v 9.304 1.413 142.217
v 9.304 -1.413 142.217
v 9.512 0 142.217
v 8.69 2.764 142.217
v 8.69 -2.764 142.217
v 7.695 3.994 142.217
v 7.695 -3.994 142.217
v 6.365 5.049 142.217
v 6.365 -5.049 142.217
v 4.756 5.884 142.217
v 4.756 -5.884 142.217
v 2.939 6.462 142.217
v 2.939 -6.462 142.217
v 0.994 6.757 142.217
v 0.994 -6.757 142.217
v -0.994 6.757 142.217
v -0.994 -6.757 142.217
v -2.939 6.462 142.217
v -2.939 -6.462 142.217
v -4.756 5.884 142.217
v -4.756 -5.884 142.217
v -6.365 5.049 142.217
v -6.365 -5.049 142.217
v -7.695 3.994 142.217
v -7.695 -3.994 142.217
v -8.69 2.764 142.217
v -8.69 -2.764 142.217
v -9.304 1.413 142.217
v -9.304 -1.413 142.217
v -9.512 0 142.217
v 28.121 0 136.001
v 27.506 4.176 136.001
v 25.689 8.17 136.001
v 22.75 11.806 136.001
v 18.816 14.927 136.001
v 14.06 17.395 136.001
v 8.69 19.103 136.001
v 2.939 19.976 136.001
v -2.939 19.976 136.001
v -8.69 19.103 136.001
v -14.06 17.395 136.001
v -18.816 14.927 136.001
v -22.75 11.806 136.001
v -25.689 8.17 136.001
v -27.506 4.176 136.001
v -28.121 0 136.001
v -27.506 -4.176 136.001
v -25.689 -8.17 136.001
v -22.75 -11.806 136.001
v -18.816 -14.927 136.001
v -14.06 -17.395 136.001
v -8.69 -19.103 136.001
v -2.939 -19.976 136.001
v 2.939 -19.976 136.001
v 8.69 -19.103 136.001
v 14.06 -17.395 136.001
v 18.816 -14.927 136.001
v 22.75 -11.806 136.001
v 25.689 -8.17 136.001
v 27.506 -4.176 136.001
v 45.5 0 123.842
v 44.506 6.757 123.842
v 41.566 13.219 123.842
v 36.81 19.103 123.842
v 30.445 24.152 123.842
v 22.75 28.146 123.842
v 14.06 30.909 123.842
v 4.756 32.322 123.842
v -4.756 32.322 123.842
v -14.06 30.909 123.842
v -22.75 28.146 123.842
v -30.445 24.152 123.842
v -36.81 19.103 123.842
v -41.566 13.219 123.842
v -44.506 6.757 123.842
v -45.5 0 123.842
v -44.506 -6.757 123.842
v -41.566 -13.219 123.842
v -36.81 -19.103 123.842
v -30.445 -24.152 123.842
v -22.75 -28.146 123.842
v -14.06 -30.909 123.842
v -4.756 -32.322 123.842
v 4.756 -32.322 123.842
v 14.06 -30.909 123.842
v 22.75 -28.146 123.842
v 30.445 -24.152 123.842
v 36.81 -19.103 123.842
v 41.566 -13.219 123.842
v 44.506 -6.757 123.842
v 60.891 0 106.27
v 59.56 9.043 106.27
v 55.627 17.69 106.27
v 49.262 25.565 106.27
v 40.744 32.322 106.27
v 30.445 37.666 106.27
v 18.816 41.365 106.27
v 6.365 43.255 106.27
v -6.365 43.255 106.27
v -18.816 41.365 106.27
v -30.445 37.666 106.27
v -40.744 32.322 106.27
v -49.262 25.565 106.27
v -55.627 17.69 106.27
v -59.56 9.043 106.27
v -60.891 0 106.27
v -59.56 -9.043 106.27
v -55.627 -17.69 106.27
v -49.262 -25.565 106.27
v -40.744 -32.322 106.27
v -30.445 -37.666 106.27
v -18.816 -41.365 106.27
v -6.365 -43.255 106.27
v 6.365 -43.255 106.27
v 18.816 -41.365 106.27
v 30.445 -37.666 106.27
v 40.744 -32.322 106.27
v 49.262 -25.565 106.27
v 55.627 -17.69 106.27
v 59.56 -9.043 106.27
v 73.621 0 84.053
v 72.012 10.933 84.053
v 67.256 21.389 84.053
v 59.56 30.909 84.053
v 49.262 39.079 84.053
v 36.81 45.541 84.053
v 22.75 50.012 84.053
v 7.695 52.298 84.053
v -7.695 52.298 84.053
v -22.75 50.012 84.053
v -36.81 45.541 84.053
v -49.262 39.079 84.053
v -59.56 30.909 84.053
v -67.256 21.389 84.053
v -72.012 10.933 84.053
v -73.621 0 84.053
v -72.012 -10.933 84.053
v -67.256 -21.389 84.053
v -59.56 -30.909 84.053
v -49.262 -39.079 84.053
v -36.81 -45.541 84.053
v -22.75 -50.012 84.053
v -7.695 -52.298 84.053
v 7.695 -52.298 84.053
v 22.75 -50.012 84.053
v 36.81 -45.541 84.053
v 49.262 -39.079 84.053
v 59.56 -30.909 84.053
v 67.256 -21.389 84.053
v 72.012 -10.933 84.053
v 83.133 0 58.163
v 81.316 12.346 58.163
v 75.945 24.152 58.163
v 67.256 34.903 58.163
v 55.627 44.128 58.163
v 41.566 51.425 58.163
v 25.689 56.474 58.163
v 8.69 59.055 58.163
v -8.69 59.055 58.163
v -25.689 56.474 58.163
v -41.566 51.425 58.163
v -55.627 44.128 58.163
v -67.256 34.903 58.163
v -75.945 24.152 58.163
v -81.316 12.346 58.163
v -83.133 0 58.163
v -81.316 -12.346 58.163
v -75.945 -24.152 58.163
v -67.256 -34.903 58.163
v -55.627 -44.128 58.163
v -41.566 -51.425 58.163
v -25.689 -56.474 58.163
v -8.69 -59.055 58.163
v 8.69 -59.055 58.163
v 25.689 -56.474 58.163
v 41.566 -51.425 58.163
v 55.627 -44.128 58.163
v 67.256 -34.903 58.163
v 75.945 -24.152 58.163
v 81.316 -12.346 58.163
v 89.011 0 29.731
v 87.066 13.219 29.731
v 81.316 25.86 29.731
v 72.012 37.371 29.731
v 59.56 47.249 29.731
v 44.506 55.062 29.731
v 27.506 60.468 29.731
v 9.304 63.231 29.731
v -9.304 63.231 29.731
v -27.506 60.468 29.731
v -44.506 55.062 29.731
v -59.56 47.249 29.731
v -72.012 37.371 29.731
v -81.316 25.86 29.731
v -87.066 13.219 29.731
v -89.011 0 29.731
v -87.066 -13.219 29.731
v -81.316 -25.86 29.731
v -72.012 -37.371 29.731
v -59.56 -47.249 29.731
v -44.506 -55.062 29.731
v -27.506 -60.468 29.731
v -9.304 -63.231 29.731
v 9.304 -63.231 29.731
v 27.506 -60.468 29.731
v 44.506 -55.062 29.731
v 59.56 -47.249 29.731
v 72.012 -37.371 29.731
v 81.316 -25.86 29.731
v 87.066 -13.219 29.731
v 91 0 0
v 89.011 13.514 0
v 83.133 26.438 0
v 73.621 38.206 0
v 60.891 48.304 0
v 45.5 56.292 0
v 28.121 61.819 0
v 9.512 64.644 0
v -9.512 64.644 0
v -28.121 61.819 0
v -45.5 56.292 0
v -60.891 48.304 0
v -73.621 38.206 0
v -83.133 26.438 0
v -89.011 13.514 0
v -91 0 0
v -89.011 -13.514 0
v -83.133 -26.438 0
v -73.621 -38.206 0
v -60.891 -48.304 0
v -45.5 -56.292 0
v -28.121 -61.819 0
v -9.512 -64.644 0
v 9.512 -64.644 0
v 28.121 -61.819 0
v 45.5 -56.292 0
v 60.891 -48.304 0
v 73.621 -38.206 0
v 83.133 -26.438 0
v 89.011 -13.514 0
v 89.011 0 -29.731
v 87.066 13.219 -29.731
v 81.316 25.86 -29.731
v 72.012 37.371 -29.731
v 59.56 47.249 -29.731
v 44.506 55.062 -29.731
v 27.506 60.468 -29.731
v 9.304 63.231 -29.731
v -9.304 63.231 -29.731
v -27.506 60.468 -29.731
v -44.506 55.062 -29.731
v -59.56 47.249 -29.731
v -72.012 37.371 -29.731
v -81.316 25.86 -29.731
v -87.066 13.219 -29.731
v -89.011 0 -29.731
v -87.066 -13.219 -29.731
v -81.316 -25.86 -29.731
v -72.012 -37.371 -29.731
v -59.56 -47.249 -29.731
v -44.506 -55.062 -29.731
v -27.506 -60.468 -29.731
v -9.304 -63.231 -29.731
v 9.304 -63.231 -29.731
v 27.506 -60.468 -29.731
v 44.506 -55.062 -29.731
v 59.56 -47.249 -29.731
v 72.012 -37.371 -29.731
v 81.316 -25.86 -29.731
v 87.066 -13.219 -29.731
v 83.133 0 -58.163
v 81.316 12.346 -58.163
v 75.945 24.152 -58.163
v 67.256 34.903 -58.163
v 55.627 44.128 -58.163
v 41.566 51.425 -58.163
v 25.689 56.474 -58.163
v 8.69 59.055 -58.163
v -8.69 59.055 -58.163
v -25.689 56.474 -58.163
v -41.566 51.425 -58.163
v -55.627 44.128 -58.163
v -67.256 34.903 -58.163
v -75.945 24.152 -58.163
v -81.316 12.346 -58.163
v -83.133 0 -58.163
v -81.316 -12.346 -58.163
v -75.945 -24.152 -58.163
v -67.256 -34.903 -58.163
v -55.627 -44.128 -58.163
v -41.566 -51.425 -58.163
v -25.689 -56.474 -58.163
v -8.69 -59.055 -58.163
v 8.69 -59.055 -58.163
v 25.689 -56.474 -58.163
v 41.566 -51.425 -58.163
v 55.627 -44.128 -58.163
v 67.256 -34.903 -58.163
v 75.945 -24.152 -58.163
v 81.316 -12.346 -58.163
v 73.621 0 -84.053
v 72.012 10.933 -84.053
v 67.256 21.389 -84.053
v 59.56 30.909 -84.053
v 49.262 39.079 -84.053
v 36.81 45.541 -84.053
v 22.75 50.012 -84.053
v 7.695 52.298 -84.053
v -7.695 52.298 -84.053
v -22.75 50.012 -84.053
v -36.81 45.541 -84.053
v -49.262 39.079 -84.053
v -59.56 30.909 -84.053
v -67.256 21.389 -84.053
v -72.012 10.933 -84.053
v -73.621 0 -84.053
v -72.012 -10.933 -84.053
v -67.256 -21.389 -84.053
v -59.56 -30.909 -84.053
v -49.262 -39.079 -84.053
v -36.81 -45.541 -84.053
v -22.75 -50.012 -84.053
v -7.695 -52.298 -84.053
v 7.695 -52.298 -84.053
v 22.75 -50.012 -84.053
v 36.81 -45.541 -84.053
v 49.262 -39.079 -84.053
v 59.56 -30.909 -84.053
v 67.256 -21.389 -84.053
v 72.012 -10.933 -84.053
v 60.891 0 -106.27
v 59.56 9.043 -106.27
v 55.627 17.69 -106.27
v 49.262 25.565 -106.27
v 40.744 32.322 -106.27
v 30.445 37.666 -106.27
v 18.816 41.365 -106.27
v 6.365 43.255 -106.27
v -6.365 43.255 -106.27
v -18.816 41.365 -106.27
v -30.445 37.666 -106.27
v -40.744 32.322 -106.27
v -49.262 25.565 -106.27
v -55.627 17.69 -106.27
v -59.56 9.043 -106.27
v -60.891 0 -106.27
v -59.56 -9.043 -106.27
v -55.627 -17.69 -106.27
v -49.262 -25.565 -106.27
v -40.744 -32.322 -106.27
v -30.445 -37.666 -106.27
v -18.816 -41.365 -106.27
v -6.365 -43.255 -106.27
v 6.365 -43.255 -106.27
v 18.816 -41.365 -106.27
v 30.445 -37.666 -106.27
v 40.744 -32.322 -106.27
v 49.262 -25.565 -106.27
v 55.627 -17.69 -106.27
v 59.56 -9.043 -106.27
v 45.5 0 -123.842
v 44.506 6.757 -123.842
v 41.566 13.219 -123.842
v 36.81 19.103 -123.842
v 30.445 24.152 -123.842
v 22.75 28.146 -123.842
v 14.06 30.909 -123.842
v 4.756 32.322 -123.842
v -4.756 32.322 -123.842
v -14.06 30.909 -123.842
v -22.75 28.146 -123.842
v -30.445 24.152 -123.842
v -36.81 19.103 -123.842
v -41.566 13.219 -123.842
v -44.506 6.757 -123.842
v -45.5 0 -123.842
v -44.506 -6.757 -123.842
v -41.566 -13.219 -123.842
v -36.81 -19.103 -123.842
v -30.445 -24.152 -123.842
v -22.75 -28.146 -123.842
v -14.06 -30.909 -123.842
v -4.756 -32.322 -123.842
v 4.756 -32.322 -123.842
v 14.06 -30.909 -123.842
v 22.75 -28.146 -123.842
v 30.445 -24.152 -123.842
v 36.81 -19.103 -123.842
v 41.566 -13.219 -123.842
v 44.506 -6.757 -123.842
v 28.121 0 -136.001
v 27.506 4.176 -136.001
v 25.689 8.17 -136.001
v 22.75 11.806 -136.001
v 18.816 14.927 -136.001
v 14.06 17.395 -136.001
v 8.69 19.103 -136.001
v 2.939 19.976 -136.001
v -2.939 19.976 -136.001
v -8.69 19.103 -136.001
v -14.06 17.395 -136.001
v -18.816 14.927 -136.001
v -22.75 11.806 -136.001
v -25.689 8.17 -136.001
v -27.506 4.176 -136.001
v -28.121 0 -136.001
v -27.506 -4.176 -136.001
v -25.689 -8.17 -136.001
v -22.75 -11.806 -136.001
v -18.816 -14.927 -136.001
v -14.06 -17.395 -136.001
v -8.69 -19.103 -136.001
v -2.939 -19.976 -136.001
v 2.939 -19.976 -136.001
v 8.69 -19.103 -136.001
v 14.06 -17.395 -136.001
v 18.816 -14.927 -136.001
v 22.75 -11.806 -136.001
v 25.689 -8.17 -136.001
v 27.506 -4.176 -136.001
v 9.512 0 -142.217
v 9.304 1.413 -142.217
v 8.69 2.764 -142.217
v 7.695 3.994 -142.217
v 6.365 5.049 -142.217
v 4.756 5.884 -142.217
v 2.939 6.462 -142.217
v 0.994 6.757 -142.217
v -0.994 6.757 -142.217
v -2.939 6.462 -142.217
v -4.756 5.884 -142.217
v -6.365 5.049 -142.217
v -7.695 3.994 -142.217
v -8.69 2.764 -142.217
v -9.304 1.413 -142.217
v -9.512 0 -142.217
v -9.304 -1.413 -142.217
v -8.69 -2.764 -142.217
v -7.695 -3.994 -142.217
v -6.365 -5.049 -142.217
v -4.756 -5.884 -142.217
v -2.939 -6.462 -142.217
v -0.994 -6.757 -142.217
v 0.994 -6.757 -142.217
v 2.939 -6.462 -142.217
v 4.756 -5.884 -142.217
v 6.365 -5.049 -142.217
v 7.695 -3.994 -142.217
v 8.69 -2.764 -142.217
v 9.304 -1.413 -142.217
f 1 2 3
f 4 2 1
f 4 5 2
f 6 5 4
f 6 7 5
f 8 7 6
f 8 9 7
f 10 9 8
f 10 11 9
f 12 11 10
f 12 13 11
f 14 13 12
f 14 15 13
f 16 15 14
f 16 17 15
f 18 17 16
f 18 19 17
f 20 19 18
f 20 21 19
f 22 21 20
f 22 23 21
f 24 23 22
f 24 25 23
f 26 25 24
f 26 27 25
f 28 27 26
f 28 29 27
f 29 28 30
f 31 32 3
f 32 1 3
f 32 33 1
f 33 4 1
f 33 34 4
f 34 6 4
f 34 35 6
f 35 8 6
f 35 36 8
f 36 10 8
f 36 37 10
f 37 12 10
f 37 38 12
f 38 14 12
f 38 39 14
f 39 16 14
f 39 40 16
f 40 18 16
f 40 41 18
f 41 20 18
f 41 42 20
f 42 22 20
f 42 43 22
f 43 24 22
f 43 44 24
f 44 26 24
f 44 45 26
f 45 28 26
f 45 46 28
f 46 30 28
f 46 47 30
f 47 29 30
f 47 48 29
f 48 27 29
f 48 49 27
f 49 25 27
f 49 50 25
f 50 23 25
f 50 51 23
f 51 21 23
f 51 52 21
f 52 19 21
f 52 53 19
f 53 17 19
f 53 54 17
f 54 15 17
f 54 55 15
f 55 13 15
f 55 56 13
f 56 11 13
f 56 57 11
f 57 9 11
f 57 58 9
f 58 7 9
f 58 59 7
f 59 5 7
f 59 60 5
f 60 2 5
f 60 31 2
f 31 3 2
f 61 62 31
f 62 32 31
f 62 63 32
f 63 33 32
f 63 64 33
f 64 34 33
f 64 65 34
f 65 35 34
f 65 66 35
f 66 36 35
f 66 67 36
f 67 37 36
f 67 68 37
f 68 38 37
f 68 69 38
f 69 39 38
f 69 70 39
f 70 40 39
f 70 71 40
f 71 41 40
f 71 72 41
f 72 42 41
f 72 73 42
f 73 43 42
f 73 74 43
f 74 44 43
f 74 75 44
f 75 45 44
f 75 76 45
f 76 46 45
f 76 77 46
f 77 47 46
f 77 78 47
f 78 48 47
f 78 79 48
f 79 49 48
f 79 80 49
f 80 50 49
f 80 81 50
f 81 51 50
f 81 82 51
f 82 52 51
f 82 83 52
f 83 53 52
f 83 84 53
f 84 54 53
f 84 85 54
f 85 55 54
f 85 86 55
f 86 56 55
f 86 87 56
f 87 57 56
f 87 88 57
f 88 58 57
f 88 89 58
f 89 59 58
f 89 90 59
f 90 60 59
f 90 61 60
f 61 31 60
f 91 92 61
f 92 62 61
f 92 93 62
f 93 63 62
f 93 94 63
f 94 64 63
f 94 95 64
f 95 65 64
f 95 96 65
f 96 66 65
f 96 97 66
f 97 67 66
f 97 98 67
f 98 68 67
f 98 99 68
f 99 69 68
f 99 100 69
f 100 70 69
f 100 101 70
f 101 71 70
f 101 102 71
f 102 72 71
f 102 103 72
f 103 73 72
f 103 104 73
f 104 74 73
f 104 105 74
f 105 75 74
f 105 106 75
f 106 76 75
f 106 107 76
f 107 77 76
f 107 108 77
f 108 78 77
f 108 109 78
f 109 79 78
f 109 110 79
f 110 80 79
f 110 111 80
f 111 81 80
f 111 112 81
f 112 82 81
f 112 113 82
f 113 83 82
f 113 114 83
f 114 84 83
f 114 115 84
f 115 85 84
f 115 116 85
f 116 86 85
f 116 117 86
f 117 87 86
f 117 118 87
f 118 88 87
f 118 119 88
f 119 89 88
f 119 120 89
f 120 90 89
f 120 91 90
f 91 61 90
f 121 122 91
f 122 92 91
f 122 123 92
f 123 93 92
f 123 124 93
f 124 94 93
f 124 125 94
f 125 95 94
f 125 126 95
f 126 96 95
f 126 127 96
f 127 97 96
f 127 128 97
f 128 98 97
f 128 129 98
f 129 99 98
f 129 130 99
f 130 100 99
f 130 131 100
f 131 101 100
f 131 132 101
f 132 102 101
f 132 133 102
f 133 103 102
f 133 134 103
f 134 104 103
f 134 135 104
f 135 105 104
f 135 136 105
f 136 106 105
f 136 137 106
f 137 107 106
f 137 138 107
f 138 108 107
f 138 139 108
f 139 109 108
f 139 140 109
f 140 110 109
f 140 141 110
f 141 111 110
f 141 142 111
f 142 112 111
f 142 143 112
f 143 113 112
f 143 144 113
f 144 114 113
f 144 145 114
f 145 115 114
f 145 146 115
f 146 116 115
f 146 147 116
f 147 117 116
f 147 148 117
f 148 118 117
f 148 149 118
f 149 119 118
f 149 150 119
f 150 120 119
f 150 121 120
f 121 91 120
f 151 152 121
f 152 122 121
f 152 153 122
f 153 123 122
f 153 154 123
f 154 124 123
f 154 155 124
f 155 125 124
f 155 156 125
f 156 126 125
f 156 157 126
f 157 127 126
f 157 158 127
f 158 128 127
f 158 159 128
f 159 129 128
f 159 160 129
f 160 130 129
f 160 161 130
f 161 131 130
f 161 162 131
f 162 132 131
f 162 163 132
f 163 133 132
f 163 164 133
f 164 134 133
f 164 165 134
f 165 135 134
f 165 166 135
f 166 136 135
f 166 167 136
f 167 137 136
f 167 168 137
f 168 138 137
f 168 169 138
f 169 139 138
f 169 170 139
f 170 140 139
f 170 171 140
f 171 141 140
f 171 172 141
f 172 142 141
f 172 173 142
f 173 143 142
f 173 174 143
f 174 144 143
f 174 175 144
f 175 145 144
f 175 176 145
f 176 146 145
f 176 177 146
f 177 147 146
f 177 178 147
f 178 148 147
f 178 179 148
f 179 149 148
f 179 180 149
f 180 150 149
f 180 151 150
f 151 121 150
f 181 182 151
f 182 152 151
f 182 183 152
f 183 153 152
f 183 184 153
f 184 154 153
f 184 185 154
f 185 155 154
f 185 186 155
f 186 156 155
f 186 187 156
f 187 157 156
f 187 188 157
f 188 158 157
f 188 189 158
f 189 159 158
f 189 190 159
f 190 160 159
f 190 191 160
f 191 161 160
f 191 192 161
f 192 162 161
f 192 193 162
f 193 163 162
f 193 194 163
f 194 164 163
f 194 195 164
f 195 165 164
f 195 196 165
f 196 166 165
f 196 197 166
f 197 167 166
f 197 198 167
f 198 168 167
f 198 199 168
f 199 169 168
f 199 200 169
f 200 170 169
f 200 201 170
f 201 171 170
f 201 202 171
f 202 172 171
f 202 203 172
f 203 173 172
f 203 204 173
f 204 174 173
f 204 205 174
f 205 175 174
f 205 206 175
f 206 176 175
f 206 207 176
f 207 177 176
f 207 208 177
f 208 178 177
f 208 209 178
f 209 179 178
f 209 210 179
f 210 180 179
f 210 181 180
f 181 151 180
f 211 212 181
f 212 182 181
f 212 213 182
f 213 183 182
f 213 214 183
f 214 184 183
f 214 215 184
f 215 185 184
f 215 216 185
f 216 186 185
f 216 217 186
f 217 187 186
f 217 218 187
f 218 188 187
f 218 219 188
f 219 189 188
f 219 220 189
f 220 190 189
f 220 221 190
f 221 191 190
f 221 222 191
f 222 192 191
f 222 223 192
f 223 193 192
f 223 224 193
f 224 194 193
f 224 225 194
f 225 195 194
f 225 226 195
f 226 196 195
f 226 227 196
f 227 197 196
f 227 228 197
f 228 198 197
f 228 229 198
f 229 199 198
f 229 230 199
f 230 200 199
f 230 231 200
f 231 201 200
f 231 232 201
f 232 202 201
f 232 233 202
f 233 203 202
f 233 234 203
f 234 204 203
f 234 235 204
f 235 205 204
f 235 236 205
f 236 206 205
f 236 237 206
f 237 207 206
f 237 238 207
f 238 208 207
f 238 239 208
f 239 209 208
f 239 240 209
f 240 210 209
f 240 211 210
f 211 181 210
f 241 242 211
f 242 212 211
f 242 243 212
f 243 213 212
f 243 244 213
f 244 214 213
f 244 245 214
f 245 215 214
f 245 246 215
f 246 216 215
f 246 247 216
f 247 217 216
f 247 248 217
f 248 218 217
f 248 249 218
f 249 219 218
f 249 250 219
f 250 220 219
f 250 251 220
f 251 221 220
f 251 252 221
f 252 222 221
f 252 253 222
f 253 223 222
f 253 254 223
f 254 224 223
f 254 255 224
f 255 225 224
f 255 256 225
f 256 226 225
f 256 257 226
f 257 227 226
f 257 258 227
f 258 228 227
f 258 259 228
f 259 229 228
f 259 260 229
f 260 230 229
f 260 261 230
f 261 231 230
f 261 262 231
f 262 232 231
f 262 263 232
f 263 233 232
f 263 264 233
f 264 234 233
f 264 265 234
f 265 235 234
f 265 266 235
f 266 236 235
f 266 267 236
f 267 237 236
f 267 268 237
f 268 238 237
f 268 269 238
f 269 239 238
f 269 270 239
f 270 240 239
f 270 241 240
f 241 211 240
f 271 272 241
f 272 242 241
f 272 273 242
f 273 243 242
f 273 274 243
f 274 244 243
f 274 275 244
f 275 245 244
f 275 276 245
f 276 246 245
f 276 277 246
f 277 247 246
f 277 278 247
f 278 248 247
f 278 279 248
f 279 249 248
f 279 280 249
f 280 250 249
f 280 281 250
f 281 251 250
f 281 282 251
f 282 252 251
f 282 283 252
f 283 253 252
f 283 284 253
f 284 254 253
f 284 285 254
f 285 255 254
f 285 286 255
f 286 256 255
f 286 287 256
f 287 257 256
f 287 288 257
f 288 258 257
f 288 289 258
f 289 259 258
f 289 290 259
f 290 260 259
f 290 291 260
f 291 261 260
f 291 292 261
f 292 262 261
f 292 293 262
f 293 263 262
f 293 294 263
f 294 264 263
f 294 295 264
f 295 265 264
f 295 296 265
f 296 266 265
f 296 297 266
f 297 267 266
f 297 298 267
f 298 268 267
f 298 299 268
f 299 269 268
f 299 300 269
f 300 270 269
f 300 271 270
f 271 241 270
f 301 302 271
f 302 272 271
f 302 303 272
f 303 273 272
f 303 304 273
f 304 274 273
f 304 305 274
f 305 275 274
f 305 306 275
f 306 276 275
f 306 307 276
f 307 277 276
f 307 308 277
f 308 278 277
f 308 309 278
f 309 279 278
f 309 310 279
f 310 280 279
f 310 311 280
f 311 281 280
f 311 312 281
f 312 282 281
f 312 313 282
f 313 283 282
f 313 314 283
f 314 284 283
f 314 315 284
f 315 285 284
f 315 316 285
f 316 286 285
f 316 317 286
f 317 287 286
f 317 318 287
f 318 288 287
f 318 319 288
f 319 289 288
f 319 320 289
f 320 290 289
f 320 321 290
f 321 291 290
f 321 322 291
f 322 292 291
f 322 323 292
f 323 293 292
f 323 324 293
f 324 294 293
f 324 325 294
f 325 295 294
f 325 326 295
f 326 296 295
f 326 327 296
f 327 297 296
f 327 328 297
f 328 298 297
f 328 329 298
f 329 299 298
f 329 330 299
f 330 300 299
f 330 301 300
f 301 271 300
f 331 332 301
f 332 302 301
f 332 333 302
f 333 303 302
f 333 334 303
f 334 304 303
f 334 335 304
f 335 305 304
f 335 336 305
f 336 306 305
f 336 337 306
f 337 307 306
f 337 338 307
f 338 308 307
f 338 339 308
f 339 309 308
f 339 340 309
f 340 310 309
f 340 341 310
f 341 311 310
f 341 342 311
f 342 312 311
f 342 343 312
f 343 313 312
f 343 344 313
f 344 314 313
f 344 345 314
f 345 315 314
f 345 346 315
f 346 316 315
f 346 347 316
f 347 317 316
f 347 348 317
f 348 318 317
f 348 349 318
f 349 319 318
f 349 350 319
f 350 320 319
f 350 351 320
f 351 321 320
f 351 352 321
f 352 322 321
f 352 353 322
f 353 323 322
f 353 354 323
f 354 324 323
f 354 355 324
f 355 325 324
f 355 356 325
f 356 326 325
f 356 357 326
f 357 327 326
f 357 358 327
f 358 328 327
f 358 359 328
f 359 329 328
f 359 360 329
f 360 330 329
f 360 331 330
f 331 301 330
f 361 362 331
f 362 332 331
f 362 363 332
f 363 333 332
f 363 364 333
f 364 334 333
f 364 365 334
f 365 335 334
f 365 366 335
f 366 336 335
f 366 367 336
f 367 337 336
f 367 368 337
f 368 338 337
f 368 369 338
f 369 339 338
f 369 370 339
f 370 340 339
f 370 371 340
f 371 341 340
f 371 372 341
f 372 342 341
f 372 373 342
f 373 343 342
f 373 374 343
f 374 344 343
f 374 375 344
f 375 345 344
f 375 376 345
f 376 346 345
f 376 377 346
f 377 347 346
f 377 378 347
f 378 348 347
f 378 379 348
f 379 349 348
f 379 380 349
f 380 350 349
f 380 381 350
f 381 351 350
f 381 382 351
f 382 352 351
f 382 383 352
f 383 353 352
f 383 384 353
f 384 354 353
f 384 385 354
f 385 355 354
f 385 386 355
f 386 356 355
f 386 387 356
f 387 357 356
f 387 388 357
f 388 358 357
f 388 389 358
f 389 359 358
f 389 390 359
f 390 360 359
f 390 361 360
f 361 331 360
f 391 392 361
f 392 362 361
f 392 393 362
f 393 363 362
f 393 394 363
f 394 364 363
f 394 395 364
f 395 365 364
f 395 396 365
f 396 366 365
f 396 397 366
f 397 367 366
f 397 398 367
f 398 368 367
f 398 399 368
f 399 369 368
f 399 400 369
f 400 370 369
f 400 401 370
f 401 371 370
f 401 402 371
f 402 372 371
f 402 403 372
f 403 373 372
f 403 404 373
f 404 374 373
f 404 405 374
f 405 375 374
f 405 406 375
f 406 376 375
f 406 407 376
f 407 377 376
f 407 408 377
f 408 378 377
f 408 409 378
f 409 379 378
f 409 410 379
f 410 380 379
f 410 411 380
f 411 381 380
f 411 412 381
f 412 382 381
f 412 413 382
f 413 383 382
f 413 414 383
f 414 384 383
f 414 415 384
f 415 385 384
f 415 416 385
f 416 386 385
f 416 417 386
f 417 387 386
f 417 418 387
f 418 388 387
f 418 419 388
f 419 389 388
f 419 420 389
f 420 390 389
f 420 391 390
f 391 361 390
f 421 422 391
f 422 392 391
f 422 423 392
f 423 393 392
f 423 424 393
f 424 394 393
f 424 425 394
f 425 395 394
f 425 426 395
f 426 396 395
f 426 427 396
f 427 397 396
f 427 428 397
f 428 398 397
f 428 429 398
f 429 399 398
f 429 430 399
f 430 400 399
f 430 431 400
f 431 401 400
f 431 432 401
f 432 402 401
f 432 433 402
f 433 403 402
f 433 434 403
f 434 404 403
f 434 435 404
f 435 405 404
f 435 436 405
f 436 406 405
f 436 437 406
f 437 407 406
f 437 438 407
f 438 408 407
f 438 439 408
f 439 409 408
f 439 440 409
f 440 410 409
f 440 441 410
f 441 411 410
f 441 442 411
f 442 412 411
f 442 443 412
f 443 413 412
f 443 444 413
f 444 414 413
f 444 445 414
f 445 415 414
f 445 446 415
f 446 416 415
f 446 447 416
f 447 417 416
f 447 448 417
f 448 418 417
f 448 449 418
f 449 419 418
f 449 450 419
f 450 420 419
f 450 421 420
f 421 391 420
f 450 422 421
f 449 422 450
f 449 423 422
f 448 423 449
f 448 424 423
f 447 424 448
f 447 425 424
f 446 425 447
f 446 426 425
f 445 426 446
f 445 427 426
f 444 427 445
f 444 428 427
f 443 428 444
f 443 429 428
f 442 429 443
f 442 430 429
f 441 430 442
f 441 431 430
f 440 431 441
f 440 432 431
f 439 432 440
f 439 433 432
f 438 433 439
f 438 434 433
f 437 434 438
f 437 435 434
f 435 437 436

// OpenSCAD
// Generated by SolidPython 1.0.1 on 2020-07-29 00:46:47


scale(v = [7, 5, 11]) {
	sphere(r = 13);
}
/***********************************************
*********      SolidPython code:      **********
************************************************
 
# import packages: SolidPython
from solid import *
from solid.utils import *
from itertools import chain, combinations, permutations


class Resize:

    def __init__(self, scad_file):
        self.scad_file = scad_file
        #self.scad_file = import_scad(scad_file)
        # cone/cylinder param:
        self.r1 = 0
        self.r2 = 0
        self.h = 0
        # rectangular prism param:
        self.w = 0
        self.l = 0
        # ellipse param:
        self.r = 0

    # import OpenScad code (file name corresponds to shape)


    # classify shape + parameters
    def assign(self, param1, param2, param3):
        if self.scad_file == 'cone.scad':
            self.r1 = param1
            self.r2 = param2
            self.h = param3
        elif self.scad_file == 'cylinder.scad':
            self.r1 = param1
            self.r2 = param2
            self.h = param3
        elif self.scad_file == 'rectangularPrism.scad':
            self.h = param1
            self.l = param2
            self.w = param3
        else:
            self.r = param1
            self.h = param2

    # resize parameters
    def iterate(self):
        x = range(3, 20, 2)
        i = 1
        if self.scad_file == 'cone.scad':
            tempList = list(permutations(x, 2))
            for temp in tempList:
                param1 = temp[0]
                param2 = temp[1]
                filepath = 'produced_scad_files/' + 'cone' + str(param1) + '_' + str(param2) + '_' + '.scad'
                scad_render_to_file(cylinder(h=param1, r1=param2, r2=0), filepath)

        elif self.scad_file == 'cylinder.scad':
            tempList = list(permutations(x, 3))
            for temp in tempList:
                param1 = temp[0]
                param2 = temp[1]
                filepath = 'produced_scad_files/' + 'cylinder' + str(param1) + '_' + str(param2) + '_' + '.scad'
                scad_render_to_file(cylinder(h=param1, r1=param2, r2=param2), filepath)

        elif self.scad_file == 'rectangularPrism.scad':
            tempList = list(permutations(x, 3))
            for temp in tempList:
                param1 = temp[0]
                param2 = temp[1]
                param3 = temp[2]
                filepath = 'produced_scad_files/' + 'rectangularPrism' + str(param1) + '_' + str(param2) + '_' + str(
                    param3) + '.scad'
                scad_render_to_file(cube(size=(param1, param2, param3)), filepath)

        elif self.scad_file == 'ellipse.scad':
            tempList = list(permutations(x, 4))
            for temp in tempList:
                param1 = temp[0]
                param2 = temp[1]
                param3 = temp[2]
                param4 = temp[3]
                filepath = 'produced_scad_files/' + 'ellipse' + str(param1) + '_' + str(param2) + '_' + str(param3) + '_' + str(param4) + '.scad'
                scad_render_to_file(scale([param1, param2, param3])(sphere(r=param4)), filepath)

    def render_to_scadfile(self):
        scad_render_to_file(scad, 'example.scad') 
 
************************************************/
